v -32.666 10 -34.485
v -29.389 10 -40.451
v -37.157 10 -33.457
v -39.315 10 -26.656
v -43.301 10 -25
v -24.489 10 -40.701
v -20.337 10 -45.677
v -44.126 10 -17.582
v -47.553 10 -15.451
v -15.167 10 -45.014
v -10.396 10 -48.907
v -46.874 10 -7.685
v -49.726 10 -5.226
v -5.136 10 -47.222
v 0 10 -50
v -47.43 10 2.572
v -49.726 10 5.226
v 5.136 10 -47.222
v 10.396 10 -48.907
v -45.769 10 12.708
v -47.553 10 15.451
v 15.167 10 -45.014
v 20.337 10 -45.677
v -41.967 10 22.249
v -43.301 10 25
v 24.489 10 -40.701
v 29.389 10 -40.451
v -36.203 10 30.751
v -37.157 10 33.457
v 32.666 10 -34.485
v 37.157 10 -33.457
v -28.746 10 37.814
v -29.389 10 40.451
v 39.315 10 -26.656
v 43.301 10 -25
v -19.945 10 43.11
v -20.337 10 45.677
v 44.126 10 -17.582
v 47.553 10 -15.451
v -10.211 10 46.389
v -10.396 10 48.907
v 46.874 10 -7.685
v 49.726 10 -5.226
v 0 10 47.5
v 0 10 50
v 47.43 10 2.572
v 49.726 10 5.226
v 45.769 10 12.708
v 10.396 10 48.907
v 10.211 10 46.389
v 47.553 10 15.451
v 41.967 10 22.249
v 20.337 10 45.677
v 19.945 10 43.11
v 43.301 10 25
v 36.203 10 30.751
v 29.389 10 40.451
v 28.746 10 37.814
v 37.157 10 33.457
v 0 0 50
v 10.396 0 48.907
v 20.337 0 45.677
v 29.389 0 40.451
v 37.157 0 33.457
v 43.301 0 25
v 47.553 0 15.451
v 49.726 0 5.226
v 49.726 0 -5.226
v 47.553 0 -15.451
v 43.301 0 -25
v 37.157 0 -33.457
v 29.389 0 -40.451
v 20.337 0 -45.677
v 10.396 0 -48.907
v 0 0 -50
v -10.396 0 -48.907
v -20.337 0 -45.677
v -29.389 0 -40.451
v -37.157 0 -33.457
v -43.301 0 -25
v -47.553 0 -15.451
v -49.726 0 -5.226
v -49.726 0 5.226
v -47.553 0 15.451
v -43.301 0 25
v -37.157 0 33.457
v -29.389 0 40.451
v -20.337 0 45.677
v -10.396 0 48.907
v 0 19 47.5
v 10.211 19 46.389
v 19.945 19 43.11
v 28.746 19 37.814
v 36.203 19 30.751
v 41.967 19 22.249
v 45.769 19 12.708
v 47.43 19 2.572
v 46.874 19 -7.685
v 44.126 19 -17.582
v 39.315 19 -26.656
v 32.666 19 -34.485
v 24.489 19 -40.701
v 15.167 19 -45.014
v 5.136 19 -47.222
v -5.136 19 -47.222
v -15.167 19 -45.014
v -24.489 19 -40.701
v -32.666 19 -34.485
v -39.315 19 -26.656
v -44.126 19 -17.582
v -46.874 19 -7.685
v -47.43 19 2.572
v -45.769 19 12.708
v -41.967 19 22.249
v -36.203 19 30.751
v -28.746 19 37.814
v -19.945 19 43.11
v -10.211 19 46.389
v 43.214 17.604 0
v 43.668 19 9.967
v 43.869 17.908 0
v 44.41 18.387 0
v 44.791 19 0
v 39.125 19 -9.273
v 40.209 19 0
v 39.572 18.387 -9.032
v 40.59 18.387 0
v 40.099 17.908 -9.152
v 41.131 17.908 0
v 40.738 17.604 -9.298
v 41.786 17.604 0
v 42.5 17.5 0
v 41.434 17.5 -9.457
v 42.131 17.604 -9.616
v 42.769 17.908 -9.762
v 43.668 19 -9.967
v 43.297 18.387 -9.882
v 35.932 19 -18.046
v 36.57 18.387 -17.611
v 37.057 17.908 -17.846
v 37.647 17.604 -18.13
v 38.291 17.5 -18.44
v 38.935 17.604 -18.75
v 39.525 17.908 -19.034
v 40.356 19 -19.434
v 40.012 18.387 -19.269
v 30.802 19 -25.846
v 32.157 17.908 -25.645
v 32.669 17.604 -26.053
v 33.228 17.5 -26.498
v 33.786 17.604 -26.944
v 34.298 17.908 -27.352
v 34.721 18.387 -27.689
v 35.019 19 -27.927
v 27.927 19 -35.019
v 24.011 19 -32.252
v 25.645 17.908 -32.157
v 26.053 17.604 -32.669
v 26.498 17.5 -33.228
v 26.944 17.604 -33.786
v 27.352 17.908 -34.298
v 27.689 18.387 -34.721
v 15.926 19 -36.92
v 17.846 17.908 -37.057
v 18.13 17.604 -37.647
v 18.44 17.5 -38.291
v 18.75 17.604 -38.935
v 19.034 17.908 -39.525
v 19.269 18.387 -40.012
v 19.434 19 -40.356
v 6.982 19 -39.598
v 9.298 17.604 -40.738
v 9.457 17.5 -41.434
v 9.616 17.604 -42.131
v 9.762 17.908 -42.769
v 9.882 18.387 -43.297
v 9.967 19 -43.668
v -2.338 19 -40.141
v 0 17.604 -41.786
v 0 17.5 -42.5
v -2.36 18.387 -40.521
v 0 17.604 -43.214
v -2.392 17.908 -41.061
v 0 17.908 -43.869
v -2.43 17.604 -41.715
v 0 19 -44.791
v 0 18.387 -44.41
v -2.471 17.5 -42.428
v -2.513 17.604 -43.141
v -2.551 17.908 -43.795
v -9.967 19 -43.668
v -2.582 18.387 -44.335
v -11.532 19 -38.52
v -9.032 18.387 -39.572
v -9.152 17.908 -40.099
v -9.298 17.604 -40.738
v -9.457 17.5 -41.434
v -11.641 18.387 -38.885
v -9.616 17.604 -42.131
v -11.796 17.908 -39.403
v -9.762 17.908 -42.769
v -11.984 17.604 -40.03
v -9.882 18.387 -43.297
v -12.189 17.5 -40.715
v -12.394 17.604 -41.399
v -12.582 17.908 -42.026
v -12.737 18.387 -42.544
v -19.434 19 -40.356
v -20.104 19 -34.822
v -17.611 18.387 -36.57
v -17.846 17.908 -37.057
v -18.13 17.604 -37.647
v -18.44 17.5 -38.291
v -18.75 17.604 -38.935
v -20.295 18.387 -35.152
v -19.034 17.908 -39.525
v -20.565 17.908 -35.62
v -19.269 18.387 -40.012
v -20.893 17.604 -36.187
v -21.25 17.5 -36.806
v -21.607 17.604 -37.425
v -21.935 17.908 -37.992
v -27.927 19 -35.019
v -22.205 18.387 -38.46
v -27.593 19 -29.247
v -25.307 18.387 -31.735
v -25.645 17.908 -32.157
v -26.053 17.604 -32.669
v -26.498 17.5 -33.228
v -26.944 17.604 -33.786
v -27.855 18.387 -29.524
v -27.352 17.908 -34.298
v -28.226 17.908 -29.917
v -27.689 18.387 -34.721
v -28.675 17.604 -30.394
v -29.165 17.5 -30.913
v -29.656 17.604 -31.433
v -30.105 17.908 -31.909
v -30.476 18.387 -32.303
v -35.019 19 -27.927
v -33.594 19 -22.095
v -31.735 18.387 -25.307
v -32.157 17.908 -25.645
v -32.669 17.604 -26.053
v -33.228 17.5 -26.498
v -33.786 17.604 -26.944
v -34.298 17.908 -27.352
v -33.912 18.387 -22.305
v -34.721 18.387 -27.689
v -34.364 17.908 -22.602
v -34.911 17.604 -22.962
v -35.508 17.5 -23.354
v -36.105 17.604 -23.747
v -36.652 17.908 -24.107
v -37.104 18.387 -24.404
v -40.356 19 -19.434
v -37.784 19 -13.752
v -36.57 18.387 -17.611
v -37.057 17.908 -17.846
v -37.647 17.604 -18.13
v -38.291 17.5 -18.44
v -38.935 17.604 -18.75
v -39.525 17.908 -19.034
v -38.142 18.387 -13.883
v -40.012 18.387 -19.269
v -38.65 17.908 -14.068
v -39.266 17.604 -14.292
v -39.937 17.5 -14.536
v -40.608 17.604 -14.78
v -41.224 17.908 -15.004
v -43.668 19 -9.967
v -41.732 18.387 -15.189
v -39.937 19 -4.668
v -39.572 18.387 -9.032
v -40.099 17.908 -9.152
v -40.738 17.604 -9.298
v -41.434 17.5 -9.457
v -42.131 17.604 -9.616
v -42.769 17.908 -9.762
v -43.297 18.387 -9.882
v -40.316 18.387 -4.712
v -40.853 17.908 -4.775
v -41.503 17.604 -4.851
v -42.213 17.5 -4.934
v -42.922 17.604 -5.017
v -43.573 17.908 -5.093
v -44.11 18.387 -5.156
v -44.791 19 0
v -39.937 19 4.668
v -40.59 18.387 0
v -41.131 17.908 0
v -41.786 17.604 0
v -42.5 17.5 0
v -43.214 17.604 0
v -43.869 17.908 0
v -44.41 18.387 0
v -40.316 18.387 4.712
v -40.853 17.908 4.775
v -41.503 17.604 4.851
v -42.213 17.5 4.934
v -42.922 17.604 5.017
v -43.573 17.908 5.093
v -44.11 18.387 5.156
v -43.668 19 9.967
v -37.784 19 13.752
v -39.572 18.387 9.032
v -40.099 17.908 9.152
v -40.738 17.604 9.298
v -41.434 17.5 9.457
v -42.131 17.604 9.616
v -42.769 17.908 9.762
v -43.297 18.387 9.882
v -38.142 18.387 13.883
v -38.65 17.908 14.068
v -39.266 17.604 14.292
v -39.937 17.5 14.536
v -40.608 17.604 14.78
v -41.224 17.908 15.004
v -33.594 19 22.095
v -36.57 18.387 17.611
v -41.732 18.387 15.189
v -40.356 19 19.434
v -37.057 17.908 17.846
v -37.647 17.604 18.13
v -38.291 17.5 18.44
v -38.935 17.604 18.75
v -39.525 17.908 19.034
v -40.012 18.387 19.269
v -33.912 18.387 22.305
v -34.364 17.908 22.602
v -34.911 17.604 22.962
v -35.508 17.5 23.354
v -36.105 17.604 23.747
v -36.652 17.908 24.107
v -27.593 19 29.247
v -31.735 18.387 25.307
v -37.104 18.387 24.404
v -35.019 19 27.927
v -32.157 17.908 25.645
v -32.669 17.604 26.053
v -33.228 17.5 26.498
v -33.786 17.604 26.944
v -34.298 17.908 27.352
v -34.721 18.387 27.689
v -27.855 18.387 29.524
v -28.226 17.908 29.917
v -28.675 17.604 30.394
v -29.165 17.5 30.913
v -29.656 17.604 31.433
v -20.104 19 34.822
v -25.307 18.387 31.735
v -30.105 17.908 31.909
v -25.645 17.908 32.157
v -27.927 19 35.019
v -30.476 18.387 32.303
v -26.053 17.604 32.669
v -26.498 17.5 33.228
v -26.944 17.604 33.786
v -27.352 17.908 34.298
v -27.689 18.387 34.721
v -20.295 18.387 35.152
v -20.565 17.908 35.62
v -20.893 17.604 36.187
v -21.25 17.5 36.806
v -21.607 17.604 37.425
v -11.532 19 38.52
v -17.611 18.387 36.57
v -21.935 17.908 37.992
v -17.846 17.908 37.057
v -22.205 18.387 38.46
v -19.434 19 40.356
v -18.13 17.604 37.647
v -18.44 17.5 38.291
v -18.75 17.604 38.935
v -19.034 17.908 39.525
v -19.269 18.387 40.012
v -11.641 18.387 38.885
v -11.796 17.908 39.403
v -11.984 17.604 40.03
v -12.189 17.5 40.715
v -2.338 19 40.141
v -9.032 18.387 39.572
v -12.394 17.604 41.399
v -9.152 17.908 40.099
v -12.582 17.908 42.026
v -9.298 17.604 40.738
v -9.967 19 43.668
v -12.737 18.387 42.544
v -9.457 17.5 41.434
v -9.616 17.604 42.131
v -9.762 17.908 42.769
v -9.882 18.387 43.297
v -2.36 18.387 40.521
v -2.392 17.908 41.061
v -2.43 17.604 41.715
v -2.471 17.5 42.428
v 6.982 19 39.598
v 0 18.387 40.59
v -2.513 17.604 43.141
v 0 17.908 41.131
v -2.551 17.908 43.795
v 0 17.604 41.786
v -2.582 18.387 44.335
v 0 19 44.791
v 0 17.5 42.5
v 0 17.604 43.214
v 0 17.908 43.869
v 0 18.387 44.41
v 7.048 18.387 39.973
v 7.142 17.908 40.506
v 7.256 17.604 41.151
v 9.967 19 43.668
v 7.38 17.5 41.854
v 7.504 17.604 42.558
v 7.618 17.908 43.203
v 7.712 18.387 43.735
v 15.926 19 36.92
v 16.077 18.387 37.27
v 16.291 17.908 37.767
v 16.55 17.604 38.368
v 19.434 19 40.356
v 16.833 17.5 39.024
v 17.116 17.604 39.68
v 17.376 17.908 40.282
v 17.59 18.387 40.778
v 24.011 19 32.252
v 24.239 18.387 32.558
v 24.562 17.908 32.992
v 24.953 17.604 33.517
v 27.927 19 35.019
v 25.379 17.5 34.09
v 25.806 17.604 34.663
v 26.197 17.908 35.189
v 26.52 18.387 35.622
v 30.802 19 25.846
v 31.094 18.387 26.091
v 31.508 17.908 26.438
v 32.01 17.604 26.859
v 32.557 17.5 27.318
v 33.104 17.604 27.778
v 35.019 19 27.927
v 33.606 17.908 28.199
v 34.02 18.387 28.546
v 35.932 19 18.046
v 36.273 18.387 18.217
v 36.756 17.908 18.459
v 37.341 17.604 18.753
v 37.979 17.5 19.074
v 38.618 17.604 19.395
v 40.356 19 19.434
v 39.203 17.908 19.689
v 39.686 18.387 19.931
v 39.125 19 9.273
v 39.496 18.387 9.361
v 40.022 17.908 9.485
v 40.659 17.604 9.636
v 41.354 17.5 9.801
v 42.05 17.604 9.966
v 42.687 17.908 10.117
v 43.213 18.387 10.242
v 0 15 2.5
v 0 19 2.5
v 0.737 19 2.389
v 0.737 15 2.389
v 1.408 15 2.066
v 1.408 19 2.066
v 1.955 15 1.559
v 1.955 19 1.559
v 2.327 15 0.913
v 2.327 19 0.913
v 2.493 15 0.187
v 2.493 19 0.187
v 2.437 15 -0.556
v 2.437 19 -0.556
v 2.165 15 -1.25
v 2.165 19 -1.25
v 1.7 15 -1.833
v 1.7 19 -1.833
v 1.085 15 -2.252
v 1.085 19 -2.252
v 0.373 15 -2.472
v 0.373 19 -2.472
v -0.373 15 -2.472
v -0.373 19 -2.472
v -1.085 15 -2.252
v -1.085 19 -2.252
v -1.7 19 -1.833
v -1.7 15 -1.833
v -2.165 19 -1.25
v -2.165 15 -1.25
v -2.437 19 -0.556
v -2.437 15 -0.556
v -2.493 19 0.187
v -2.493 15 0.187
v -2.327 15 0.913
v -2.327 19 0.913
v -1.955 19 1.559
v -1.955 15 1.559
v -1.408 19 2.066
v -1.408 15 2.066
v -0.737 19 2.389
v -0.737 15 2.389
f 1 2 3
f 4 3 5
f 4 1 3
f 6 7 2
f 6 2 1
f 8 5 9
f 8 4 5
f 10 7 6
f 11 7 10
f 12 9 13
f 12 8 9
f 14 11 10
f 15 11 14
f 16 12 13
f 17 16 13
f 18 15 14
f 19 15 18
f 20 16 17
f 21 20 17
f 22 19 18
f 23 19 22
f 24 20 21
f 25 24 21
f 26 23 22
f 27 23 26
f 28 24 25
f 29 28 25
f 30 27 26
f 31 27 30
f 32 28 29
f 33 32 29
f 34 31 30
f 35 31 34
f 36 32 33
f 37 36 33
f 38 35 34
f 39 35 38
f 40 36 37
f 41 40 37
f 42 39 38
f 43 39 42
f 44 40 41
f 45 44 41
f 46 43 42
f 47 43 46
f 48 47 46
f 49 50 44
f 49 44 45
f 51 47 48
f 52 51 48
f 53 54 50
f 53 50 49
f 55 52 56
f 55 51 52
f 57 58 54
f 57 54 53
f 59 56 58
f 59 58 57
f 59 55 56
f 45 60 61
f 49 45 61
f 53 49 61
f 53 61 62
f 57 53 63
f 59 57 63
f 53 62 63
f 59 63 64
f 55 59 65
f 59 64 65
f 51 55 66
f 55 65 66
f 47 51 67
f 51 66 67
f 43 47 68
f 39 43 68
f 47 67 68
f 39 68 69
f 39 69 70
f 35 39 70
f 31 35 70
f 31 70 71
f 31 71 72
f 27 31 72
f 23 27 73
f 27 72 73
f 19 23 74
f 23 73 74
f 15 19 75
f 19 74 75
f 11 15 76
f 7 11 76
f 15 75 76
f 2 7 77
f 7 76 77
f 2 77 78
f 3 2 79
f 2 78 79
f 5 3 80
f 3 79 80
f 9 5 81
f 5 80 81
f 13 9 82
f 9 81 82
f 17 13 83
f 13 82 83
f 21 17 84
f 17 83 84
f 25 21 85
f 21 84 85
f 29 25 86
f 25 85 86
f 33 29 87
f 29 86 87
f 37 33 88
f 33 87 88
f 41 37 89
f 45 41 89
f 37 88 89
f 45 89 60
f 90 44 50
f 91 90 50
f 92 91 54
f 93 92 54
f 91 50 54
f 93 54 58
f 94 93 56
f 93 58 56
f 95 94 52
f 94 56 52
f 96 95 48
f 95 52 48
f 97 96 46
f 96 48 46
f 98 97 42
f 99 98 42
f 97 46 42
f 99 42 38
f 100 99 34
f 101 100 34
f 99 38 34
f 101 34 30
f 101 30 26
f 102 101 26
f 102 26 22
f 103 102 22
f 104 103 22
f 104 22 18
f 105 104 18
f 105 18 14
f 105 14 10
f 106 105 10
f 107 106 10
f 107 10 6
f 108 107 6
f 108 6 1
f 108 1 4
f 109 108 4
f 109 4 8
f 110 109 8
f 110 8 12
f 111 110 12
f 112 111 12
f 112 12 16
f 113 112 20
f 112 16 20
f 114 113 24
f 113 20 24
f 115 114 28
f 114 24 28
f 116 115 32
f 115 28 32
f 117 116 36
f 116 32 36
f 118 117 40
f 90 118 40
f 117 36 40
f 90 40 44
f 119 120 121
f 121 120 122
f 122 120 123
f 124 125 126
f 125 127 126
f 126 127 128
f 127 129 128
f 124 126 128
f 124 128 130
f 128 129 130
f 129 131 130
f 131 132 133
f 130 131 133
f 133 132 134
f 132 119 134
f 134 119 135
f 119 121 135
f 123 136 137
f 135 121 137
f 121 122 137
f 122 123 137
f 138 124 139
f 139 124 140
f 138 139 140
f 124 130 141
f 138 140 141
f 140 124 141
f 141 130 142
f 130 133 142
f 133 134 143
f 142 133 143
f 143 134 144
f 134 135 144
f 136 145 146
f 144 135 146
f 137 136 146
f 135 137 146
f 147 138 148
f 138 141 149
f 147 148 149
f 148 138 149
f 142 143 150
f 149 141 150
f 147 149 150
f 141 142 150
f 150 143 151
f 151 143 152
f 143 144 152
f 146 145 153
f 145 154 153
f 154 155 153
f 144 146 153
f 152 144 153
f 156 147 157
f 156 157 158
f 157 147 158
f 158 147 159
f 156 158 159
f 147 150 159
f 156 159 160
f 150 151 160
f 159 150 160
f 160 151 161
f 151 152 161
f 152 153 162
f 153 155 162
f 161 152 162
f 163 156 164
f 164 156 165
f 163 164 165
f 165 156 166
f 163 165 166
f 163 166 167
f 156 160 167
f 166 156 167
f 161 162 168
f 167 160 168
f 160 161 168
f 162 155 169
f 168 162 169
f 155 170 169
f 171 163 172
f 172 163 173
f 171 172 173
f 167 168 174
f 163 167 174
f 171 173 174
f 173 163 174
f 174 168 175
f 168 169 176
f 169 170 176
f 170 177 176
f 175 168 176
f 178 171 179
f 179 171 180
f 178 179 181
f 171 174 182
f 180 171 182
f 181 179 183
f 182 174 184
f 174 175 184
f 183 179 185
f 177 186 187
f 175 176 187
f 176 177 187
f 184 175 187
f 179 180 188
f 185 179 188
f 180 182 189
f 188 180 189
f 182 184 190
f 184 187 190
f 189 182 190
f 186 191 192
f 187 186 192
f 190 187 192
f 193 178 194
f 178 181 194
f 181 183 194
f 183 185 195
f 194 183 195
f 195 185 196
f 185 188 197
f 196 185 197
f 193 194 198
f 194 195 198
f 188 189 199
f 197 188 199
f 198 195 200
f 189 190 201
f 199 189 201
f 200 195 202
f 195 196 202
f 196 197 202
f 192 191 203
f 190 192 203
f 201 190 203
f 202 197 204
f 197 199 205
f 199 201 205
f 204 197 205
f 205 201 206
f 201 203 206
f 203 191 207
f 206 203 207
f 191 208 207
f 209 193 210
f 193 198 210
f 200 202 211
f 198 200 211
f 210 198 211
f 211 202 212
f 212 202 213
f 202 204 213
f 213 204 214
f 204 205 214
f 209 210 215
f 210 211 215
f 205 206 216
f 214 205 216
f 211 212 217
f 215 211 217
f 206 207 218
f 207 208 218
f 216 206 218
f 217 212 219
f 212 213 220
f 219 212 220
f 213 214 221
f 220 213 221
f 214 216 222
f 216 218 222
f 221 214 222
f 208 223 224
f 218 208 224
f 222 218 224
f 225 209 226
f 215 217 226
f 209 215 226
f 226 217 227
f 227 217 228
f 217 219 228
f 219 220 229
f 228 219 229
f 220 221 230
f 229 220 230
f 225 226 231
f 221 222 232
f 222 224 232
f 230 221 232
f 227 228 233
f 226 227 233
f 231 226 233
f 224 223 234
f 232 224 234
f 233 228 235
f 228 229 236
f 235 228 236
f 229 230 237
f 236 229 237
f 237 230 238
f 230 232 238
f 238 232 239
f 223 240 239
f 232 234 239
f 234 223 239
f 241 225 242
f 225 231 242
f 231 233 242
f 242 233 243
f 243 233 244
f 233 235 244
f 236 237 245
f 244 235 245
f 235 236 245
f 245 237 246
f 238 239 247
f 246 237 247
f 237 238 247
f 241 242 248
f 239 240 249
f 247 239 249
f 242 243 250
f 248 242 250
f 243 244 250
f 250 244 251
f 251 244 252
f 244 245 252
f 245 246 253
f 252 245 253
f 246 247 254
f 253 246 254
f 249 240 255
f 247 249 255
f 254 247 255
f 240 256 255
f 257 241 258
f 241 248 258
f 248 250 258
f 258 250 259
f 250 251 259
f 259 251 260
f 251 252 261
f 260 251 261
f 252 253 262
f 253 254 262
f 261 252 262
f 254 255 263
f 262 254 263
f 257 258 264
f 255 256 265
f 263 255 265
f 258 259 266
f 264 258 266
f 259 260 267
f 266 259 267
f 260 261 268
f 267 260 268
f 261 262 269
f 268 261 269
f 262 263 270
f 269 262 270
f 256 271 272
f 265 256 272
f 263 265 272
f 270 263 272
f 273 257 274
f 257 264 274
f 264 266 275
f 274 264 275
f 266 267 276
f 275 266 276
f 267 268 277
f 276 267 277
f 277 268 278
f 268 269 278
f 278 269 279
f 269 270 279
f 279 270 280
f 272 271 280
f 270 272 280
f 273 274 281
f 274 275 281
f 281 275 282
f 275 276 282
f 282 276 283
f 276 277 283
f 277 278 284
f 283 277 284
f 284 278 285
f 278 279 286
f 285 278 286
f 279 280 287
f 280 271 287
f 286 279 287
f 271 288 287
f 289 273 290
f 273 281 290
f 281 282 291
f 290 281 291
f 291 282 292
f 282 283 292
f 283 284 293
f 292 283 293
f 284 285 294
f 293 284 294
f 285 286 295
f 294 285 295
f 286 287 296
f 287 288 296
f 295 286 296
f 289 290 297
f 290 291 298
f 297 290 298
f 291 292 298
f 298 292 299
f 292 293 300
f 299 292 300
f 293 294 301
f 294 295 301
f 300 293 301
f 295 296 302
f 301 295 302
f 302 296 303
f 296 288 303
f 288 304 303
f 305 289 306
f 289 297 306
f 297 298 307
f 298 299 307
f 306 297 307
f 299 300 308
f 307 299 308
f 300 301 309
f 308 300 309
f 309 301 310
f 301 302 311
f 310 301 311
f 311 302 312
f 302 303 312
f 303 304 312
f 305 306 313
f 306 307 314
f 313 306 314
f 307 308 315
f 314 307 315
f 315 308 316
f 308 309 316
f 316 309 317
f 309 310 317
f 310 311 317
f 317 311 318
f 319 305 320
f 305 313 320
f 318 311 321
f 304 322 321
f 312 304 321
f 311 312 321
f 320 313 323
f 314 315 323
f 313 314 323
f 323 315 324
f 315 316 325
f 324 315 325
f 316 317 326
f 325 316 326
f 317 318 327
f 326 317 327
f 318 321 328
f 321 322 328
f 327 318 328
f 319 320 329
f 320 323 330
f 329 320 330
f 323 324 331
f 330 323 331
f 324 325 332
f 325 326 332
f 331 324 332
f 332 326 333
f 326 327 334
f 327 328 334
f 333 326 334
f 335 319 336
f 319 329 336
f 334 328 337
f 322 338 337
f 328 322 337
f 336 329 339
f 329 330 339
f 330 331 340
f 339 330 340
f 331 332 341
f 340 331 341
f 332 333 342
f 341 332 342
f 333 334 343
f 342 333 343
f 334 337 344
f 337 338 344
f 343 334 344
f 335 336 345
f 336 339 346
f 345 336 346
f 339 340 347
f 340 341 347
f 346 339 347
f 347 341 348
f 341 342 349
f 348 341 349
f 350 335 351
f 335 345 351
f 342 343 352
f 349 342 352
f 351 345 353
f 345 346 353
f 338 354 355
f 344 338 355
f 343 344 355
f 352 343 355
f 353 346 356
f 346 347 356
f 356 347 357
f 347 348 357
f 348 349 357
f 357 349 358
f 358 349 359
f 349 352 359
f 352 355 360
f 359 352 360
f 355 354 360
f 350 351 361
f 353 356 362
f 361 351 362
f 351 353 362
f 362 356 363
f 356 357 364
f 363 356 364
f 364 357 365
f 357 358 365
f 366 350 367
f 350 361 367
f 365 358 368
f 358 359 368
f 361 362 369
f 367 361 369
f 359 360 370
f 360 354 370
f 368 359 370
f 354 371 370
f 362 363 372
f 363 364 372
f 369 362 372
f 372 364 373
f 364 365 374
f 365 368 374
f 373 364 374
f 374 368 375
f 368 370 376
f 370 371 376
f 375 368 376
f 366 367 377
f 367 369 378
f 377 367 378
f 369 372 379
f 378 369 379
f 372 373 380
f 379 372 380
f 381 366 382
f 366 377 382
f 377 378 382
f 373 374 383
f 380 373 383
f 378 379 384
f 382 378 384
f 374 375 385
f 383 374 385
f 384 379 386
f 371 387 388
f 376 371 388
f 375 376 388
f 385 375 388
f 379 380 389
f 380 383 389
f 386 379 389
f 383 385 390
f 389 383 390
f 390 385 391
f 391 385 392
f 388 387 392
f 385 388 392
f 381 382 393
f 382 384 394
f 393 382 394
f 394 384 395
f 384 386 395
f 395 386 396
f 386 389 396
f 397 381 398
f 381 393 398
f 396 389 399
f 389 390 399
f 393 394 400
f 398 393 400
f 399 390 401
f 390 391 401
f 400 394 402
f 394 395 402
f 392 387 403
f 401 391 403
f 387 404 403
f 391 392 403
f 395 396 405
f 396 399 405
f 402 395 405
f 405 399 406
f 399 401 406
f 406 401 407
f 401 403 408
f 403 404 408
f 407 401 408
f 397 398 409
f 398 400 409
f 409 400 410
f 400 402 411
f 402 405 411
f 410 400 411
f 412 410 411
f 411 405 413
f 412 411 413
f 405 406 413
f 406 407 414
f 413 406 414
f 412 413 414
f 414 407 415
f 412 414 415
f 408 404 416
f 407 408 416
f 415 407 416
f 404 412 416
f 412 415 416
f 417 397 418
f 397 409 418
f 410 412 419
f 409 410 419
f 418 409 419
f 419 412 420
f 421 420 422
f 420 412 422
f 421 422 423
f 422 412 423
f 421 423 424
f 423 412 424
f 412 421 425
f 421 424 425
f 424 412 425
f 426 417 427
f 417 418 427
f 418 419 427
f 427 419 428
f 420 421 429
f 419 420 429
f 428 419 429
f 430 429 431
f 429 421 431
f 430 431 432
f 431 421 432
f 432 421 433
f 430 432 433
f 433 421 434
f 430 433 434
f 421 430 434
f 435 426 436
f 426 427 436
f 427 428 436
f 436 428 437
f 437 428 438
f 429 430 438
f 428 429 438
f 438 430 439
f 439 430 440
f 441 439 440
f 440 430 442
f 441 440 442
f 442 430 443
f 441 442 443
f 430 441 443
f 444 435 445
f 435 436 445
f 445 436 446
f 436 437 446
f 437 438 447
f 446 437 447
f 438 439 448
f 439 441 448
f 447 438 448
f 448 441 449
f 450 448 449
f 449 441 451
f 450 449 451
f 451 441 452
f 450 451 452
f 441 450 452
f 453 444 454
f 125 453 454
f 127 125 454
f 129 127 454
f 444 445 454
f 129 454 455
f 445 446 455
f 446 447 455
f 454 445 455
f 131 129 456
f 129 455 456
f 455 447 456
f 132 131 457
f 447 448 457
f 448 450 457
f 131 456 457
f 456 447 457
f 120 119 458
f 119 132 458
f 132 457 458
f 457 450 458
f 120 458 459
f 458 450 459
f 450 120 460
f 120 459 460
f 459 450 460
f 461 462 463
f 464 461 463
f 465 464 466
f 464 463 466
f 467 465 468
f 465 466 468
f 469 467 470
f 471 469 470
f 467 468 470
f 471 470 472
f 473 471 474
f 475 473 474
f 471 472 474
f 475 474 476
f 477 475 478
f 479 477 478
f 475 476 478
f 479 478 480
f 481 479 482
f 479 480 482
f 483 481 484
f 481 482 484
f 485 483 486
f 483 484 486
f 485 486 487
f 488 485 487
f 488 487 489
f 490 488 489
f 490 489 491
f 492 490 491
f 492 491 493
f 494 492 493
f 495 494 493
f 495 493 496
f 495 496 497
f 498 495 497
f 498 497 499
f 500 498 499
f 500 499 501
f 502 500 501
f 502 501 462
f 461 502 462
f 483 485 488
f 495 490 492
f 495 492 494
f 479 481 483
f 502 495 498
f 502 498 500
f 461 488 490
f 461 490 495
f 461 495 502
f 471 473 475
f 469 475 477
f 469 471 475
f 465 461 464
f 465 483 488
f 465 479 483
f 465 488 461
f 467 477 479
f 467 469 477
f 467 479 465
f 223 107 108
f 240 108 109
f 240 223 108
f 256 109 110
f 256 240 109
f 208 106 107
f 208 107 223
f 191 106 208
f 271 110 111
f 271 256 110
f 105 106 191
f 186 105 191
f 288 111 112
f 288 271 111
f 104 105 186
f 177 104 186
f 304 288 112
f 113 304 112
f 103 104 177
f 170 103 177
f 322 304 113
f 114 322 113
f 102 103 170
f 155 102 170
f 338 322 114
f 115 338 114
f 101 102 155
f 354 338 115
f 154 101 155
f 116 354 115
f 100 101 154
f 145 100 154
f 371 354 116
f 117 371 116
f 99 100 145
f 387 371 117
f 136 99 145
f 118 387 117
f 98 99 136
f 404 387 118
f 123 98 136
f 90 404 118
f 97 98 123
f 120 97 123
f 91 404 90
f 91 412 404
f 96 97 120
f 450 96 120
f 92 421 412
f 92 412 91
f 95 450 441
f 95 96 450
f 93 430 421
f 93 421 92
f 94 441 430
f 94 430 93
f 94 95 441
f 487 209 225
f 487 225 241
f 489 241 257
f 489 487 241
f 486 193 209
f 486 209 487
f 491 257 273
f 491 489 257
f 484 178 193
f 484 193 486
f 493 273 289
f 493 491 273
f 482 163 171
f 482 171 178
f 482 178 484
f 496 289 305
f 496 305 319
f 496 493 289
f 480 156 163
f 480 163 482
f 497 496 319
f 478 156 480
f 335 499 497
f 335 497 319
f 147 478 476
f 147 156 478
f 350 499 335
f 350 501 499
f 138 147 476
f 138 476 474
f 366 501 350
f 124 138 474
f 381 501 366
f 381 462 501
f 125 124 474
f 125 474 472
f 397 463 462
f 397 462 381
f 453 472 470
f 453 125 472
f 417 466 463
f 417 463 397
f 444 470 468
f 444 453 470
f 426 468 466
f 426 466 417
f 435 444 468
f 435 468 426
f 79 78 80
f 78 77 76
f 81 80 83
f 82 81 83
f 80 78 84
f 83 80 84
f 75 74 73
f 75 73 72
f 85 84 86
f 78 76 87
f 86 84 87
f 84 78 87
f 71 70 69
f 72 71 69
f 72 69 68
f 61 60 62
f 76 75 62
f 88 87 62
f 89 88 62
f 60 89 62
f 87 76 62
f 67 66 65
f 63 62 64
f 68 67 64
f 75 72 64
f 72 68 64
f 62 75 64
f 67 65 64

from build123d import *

# Parameters (mm, degrees)
SKETCH1_R           = 50
BOSS_EXTRUDE1_DEPTH = 10
SKETCH3_R           = 47.5
BOSS_EXTRUDE2_DEPTH = 10
SKETCH5_R           = 2.5
SKETCH6_R           = 2.5
CUT_EXTRUDE1_DEPTH  = 5
CUT_EXTRUDE2_START  = -1
SKETCH7_R           = 47.5
CUT_EXTRUDE2_DEPTH  = 1


with BuildPart() as part:
    # Sketch1 → Boss-Extrude1 (new body)
    with BuildSketch(Plane(origin=(0, 0, 0), x_dir=(1, 0, 0), z_dir=(0, 1, 0))):
        with Locations(Location((0, 0, 0), (0, 0, 270))):
            Circle(SKETCH1_R)
    extrude(amount=BOSS_EXTRUDE1_DEPTH)

    # Sketch3 → Boss-Extrude2 (add)
    with BuildSketch(Plane(origin=(0, 10, 0), x_dir=(1, 0, 0), z_dir=(0, 1, 0))):
        with Locations(Location((0, 0, 0), (0, 0, 270))):
            Circle(SKETCH3_R)
    extrude(amount=BOSS_EXTRUDE2_DEPTH)

    # Cut-Sweep1: sweep along a path in Sketch4
    with BuildLine(Plane(origin=(0, 20, 0), x_dir=(1, 0, 0), z_dir=(0, 1, 0))) as cut_sweep1_path:
        CenterArc((0, 0), 42.5, 0, 360)
    # Sketch5 → Cut-Sweep1 (sweep, cut)
    with BuildSketch(Plane.XY):
        with Locations((42.5, 20)):
            Circle(SKETCH5_R)
    sweep(path=cut_sweep1_path.line, mode=Mode.SUBTRACT)

    # Sketch6 → Cut-Extrude1 (cut)
    with BuildSketch(Plane(origin=(0, 20, 0), x_dir=(1, 0, 0), z_dir=(0, 1, 0))):
        with Locations(Location((0, 0, 0), (0, 0, 270))):
            Circle(SKETCH6_R)
    extrude(amount=-CUT_EXTRUDE1_DEPTH, mode=Mode.SUBTRACT)

    # Sketch7 → Cut-Extrude2 (cut)
    with BuildSketch(Plane(origin=(0, 20, 0), x_dir=(1, 0, 0), z_dir=(0, 1, 0)).offset(CUT_EXTRUDE2_START)):
        with Locations(Location((0, 0, 0), (0, 0, 270))):
            Circle(SKETCH7_R)
    extrude(amount=CUT_EXTRUDE2_DEPTH, mode=Mode.SUBTRACT)


solid = part.part
